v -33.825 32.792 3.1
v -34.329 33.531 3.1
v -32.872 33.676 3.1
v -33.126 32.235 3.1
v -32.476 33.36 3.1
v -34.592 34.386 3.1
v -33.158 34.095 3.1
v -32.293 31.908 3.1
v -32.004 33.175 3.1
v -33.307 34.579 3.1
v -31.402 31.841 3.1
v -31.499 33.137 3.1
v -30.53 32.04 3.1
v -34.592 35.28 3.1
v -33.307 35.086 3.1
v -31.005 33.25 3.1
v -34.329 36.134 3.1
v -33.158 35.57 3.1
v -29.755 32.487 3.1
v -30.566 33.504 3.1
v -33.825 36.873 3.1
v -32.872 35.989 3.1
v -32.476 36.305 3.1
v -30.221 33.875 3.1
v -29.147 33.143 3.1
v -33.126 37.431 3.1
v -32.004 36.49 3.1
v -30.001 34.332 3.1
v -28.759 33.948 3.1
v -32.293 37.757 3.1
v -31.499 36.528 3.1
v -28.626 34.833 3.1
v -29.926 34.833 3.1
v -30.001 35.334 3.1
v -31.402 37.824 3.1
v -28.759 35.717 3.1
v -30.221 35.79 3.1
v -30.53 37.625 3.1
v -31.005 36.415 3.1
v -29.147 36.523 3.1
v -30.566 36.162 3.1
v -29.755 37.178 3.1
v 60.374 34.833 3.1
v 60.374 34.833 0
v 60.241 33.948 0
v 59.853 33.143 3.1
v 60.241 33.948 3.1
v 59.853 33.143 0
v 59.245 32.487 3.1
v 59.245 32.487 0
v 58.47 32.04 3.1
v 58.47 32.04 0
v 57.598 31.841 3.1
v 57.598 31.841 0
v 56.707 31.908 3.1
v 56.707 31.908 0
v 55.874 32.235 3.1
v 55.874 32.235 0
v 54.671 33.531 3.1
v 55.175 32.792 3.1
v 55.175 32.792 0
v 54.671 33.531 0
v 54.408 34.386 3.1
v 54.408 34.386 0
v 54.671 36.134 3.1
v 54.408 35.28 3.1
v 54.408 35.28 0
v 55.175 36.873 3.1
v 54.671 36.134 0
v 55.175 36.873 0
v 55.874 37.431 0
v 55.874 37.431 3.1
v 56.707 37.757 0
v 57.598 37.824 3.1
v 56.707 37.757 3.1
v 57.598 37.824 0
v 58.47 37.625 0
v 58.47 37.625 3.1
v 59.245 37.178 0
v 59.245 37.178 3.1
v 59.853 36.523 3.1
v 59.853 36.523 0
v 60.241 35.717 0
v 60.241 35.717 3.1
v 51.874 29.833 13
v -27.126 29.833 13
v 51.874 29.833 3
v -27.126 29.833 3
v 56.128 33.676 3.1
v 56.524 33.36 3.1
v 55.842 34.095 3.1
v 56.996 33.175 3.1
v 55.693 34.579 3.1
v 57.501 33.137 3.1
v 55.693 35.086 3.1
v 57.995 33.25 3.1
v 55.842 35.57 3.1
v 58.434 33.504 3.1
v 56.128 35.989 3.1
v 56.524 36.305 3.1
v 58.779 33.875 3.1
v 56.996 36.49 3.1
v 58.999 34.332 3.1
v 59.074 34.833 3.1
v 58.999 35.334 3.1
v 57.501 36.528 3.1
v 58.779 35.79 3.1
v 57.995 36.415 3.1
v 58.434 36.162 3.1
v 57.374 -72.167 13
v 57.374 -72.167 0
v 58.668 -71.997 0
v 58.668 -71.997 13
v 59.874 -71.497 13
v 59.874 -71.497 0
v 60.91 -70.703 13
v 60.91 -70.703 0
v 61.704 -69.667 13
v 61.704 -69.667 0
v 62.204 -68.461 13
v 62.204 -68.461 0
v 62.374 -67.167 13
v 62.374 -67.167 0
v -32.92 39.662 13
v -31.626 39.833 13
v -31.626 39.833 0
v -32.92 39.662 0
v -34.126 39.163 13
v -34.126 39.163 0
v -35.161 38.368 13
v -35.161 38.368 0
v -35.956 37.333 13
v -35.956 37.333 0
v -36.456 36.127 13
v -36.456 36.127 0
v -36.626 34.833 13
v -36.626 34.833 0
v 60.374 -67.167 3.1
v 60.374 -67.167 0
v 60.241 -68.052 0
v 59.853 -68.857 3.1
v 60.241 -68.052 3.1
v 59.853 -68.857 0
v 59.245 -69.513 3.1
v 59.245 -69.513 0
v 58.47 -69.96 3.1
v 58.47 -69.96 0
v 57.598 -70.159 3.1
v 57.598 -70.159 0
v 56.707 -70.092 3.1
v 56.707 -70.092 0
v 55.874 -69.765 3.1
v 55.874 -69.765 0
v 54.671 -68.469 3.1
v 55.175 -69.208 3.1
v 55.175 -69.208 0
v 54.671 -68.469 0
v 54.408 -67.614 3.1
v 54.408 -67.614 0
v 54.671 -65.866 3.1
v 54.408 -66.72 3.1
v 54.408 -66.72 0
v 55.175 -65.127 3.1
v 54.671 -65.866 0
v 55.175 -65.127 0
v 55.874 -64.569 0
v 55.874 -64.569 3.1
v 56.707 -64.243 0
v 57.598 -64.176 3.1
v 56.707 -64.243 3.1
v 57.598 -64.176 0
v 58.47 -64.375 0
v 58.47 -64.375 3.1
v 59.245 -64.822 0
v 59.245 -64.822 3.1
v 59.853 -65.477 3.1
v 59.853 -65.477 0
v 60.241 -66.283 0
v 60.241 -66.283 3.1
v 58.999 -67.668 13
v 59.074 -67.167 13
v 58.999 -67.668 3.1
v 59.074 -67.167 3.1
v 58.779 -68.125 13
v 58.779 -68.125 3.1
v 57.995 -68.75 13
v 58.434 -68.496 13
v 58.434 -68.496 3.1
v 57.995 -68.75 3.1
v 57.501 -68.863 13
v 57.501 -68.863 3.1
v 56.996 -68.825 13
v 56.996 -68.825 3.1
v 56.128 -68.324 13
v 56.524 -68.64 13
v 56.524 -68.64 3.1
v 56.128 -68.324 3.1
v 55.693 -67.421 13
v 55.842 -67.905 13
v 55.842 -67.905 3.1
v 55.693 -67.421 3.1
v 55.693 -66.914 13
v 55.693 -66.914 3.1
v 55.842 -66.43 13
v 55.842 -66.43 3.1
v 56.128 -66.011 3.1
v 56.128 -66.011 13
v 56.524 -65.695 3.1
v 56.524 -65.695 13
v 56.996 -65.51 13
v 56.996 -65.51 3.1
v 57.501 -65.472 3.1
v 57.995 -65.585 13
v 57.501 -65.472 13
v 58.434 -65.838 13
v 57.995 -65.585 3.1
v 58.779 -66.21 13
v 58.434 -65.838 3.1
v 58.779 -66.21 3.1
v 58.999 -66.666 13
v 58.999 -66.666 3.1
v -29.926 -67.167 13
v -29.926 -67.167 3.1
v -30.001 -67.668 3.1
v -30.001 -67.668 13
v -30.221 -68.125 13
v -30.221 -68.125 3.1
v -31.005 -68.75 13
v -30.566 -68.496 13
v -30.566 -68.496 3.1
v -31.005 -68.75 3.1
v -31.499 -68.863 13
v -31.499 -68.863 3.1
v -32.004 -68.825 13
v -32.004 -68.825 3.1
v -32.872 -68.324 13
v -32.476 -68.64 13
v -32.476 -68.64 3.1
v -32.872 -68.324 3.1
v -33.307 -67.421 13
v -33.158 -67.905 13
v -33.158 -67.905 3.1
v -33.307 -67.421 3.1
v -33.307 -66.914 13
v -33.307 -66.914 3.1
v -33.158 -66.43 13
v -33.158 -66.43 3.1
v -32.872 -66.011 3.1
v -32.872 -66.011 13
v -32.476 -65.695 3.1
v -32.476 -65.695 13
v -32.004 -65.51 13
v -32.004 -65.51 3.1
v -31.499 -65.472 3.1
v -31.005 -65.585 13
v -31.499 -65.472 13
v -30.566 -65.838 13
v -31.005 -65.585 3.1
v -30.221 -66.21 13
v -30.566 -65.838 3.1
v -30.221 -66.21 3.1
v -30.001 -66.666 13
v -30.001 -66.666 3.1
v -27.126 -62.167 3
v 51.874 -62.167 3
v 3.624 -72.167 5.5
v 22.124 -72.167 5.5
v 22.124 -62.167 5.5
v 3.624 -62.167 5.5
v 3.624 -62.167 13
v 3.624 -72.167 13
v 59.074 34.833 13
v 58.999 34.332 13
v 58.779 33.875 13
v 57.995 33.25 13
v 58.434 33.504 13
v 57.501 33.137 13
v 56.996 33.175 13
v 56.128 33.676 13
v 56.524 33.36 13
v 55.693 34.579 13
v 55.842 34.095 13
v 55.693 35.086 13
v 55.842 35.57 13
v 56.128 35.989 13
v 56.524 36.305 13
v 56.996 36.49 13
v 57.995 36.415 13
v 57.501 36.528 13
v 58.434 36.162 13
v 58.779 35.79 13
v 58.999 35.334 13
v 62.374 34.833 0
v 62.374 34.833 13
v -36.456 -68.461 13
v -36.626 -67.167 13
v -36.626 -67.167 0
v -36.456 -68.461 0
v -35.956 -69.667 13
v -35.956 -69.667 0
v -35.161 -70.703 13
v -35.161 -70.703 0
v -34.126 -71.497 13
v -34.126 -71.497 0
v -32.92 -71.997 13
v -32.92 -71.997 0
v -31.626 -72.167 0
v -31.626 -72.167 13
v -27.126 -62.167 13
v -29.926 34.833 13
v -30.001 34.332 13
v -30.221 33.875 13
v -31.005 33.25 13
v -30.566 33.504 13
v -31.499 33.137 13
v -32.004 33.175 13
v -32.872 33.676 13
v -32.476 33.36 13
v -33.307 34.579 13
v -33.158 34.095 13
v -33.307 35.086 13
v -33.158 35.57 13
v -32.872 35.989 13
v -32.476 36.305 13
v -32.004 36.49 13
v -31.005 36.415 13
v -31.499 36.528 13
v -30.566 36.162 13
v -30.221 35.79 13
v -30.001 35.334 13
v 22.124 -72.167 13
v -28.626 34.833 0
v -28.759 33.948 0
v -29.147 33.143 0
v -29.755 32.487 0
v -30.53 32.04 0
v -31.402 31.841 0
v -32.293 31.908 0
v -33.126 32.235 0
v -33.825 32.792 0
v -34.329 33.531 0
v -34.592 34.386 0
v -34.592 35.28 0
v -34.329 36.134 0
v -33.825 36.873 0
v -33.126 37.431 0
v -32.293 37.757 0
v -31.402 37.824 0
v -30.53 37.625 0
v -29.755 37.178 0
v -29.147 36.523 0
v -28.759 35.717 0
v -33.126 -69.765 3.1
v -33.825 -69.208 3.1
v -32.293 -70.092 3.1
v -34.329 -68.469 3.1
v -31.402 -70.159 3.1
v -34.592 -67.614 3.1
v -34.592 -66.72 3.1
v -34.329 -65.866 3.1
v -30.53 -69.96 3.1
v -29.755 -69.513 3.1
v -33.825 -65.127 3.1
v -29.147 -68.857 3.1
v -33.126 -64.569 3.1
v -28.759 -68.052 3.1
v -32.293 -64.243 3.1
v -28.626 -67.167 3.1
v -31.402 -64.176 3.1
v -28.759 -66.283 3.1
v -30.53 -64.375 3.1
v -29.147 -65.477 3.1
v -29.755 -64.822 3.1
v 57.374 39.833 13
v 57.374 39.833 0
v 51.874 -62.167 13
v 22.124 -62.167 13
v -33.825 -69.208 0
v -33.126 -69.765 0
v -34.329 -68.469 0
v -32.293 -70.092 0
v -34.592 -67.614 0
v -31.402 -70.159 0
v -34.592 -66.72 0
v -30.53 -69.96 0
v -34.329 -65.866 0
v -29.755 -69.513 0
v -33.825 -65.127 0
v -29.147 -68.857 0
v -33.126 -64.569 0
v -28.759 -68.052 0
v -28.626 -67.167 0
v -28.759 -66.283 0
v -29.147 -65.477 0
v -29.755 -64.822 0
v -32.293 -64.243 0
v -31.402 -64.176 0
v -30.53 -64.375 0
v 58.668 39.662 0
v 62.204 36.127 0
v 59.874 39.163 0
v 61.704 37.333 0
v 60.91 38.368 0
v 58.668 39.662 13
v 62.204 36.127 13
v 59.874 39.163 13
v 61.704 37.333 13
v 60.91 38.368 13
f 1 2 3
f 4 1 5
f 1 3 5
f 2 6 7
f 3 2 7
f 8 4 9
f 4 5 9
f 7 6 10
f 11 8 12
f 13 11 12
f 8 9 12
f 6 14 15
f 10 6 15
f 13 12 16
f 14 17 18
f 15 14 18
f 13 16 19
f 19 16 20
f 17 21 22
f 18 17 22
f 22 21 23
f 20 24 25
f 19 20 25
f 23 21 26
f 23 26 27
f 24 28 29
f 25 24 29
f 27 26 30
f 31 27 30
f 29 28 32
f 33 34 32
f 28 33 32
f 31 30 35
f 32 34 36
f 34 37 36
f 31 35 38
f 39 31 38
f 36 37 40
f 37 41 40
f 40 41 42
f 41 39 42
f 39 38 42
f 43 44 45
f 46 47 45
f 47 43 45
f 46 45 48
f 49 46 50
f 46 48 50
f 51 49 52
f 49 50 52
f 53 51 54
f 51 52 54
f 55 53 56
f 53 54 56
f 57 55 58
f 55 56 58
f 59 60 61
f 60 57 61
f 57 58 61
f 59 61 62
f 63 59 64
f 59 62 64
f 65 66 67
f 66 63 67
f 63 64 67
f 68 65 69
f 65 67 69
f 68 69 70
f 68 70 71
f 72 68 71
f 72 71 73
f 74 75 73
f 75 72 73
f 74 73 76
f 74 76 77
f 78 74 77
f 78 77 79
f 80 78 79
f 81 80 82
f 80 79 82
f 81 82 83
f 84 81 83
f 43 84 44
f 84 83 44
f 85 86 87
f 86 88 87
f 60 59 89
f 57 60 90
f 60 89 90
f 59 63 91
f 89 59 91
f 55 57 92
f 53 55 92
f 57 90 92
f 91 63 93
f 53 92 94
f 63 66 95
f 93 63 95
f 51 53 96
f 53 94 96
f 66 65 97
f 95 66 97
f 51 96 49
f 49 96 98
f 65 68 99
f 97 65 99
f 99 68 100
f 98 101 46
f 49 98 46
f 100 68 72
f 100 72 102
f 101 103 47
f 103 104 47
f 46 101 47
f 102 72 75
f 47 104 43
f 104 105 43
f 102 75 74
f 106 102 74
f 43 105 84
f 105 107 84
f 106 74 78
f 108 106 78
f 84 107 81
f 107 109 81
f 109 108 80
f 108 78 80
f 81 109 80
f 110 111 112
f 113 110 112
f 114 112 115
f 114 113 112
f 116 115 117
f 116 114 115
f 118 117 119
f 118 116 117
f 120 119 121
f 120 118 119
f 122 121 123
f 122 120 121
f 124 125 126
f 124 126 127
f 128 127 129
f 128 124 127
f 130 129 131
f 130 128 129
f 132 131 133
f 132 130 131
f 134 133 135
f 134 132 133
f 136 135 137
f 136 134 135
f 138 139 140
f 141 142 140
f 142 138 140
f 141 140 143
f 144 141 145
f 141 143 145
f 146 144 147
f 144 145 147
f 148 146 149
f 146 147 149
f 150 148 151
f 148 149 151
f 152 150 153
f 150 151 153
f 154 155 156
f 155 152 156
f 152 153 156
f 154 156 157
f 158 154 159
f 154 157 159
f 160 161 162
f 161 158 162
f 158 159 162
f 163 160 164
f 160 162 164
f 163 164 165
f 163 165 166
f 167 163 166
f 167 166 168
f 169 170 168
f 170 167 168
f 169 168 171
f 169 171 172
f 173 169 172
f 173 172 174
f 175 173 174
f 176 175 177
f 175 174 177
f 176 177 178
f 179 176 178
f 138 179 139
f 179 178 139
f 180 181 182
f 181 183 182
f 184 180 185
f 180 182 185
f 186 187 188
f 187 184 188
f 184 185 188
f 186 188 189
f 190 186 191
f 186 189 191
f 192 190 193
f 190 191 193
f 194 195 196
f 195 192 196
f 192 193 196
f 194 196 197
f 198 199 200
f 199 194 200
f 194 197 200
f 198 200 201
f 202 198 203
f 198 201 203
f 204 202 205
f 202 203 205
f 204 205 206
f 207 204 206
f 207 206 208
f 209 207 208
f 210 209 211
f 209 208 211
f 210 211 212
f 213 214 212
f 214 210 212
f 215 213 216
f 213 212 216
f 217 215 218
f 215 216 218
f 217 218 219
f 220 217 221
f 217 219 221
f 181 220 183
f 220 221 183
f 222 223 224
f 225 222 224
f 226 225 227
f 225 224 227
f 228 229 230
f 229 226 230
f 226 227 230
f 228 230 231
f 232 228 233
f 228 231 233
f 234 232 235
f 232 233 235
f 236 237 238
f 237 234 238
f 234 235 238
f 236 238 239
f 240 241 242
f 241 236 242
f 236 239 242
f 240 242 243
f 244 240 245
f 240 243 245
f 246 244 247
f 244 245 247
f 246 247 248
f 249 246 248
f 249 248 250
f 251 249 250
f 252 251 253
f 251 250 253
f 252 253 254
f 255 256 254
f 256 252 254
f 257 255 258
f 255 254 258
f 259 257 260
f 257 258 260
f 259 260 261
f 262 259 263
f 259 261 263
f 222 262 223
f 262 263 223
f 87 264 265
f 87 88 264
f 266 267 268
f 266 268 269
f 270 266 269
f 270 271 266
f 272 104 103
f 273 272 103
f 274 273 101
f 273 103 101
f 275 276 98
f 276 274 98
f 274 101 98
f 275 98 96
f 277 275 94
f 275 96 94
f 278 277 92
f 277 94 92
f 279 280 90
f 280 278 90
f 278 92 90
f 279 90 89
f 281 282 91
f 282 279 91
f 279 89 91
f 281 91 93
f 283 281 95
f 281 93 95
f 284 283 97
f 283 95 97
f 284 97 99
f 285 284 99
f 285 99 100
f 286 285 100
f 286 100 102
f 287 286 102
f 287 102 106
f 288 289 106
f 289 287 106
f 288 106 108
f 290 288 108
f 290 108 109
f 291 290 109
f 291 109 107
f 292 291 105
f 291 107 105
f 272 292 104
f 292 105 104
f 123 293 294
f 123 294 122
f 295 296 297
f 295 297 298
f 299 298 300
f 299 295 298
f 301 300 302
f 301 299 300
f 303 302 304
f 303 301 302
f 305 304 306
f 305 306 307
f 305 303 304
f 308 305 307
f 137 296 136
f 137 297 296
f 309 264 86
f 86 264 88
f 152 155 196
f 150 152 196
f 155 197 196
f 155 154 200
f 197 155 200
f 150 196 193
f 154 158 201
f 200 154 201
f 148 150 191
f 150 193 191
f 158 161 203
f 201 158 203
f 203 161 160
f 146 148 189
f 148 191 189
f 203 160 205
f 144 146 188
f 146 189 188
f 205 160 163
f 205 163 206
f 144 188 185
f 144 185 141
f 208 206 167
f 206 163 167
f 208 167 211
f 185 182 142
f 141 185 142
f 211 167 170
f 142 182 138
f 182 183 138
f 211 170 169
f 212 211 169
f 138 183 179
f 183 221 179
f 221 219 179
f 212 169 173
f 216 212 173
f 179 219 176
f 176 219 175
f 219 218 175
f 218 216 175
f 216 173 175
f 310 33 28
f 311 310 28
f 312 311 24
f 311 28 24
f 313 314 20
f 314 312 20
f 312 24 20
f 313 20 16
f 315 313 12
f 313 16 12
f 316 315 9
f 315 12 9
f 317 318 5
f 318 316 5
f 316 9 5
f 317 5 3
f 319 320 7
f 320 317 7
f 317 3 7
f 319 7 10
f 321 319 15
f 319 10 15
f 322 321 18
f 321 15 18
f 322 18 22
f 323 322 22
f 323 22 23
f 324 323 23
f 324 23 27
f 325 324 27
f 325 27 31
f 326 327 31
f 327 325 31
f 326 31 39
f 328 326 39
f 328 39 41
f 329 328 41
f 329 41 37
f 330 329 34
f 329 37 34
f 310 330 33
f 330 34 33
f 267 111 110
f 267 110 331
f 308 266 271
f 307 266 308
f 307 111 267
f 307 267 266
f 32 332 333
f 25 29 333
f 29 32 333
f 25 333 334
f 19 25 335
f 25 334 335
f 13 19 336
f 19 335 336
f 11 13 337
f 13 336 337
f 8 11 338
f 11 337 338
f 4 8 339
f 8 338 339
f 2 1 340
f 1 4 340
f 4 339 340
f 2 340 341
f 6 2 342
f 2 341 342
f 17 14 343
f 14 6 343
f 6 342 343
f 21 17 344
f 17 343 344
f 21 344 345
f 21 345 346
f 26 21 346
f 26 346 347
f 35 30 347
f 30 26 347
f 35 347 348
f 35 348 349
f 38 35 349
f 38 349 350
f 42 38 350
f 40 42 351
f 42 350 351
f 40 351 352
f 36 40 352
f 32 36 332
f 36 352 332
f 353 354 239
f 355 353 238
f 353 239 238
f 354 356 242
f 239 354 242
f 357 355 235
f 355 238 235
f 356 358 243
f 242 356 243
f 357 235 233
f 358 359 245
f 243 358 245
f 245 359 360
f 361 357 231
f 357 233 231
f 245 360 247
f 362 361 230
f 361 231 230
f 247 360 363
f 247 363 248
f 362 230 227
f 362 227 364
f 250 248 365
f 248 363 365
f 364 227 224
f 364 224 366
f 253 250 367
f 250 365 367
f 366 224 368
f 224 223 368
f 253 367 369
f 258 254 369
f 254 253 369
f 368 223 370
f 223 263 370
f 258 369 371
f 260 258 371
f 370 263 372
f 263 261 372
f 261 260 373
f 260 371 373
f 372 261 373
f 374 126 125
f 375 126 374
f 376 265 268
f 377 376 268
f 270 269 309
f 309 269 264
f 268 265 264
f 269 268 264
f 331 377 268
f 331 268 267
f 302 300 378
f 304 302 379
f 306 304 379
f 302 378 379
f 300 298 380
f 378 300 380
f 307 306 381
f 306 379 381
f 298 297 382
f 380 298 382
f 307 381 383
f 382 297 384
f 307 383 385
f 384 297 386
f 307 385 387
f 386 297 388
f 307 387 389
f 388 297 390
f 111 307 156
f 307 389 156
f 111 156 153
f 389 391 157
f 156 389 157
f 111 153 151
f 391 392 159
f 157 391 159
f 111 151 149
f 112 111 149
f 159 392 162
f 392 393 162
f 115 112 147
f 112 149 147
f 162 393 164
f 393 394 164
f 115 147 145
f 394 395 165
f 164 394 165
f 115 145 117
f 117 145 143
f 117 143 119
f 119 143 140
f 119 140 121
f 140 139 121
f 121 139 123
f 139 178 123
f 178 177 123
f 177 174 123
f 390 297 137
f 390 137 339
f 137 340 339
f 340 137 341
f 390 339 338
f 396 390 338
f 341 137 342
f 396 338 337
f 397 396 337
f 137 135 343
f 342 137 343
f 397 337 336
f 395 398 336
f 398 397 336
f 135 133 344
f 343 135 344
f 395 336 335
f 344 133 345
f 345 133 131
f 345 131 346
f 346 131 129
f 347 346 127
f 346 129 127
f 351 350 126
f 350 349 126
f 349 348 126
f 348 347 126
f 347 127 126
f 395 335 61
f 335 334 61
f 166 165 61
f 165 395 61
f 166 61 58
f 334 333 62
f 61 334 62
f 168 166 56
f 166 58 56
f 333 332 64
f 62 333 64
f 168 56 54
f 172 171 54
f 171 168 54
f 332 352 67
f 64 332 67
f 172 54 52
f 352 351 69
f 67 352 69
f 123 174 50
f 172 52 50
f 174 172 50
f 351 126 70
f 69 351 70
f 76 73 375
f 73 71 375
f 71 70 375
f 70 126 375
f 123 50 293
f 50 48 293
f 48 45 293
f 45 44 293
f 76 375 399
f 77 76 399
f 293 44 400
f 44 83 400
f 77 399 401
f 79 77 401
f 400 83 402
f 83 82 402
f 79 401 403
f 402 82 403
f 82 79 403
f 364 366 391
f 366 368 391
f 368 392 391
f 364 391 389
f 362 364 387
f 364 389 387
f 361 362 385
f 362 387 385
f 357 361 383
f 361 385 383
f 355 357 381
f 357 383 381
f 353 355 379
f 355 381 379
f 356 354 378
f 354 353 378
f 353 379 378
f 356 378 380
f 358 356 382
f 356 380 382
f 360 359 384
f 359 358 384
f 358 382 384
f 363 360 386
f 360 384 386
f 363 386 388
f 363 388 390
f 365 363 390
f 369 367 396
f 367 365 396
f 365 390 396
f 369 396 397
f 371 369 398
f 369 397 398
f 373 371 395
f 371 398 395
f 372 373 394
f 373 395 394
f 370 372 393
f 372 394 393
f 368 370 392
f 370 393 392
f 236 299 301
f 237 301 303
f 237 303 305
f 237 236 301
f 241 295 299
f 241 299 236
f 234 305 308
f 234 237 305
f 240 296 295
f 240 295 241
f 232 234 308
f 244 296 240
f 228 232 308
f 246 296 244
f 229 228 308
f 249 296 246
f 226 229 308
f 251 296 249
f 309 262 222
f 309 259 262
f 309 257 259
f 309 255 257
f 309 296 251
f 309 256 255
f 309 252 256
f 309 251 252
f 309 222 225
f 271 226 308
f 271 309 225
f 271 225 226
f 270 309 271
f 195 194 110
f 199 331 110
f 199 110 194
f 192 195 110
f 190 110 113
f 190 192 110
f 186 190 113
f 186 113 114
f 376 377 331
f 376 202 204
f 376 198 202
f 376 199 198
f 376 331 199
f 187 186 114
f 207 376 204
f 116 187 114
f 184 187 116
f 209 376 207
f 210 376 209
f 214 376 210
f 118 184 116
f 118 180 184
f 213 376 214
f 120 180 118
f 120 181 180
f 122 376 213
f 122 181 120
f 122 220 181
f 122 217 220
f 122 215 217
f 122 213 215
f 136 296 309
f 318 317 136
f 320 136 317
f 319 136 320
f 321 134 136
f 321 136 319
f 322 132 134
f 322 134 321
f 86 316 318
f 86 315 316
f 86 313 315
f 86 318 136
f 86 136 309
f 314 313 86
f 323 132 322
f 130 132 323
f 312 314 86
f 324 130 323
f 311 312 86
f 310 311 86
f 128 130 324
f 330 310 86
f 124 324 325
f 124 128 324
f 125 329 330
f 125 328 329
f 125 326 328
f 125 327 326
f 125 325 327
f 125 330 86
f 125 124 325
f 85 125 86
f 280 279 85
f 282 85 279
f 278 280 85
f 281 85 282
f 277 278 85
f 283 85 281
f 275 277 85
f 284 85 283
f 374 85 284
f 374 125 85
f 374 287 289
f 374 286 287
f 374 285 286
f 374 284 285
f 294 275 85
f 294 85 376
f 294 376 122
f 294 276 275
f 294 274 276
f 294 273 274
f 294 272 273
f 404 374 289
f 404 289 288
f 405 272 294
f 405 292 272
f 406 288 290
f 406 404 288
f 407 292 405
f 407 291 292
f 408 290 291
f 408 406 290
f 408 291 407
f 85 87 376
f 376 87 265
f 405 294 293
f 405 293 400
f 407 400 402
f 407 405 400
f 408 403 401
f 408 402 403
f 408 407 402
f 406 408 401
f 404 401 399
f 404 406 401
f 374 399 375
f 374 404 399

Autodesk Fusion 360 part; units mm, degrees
sketch "Sketch1" plane through (0, 0, 0) normal (0, 0, 1) x (1, 0, 0)
  line L0 (-27.1259, 29.8327) -> (51.8741, 29.8327)
  line L1 (51.8741, 29.8327) -> (51.8741, -62.1673)
  line L2 (51.8741, -62.1673) -> (-27.1259, -62.1673)
  line L3 (-27.1259, -62.1673) -> (-27.1259, 29.8327)
  line L4 (62.3741, -72.1673) -> (-36.6259, -72.1673)
  line L5 (-36.6259, -72.1673) -> (-36.6259, 39.8327)
  line L6 (-36.6259, 39.8327) -> (62.3741, 39.8327)
  line L7 (62.3741, 39.8327) -> (62.3741, -72.1673)
  line L8 (62.3741, -72.1673) -> (-36.6259, 39.8327) construction
  line L9 (-36.6259, -72.1673) -> (62.3741, 39.8327) construction
  circle A0 centre (-31.6259, -67.1673) radius 1.7
  circle A1 centre (-31.6259, 34.8327) radius 1.7
  circle A2 centre (57.3741, 34.8327) radius 1.7
  circle A3 centre (57.3741, -67.1673) radius 1.7
  circle A4 centre (-31.6259, 34.8327) radius 3
  circle A5 centre (57.3741, 34.8327) radius 3
  circle A6 centre (57.3741, -67.1673) radius 3
  circle A7 centre (-31.6259, -67.1673) radius 3
  point P0 (12.8741, -16.1673)
  dimension "d1" = 79
  dimension "d3" = 99
  dimension "d4" = 112
  dimension "d13" = 3.4
  dimension "d14" = 5
  dimension "d15" = 5
  dimension "d16" = 9.5
  dimension "d17" = 6
  dimension "d18" = 6
  dimension "d19" = 6
  dimension "d20" = 6
extrude "Extrude1" add sketch "Sketch1" along normal blind 9.9 from surface at 3.1 contours A4 | A5 | A6 | A7 makes body 1 at (-34.6222, 34.6832, 9.7) makes body 2 at (-34.3904, -68.3326, 9.7) makes body 3 at (54.3778, 34.6832, 9.7) makes body 4 at (54.8142, -68.7316, 9.7)
extrude "Extrude2" add sketch "Sketch1" along normal blind 13 contours L4 L5 L6 L7 bodies 1 2 3 4
extrude "Extrude3" add sketch "Sketch1" along normal blind 3 contours L0 L1 L2 L3 bodies 1
sketch "Sketch2" plane through (0, 0, 13) normal (0, 0, 1) x (-1, 0, 0)
  circle A0 centre (31.6259, -34.8327) radius 1.7
  circle A1 centre (-57.3741, 67.1673) radius 1.7
  line L0 (-51.8741, 62.1673) -> (27.1259, 62.1673)
  line L1 (27.1259, 62.1673) -> (27.1259, -29.8327)
  line L2 (27.1259, -29.8327) -> (-51.8741, -29.8327)
  line L3 (-51.8741, -29.8327) -> (-51.8741, 62.1673)
  line L4 (-62.3741, -39.8327) -> (36.6259, -39.8327)
  line L5 (36.6259, -39.8327) -> (36.6259, 72.1673)
  line L6 (36.6259, 72.1673) -> (-62.3741, 72.1673)
  line L7 (-62.3741, 72.1673) -> (-62.3741, -39.8327)
  circle A2 centre (31.6259, 67.1673) radius 1.7
  circle A3 centre (-57.3741, -34.8327) radius 1.7
  line L8 (-3.6241, 62.1673) -> (-22.1241, 62.1673)
  line L9 (-22.1241, 62.1673) -> (-22.1241, 72.1673)
  line L10 (-22.1241, 72.1673) -> (-3.6241, 72.1673)
  line L11 (-3.6241, 72.1673) -> (-3.6241, 62.1673)
  line L12 (-3.6241, 62.1673) -> (-22.1241, 72.1673) construction
  line L13 (-22.1241, 62.1673) -> (-3.6241, 72.1673) construction
  point P0 (-12.8741, 67.1673)
  dimension "d28" = 18.5
extrude "Extrude4" cut sketch "Sketch2" against normal blind 7.5 contours L0 L6 L8 L9 L10 L11 bodies 1
fillet "Fillet1" radius 5 1 edges at (-36.6259, 39.8327, 6.5) on bodies 1
fillet "Fillet2" radius 5 3 edges at (62.3741, 39.8327, 6.5) (62.3741, -72.1673, 6.5) (-36.6259, -72.1673, 6.5) on bodies 1
